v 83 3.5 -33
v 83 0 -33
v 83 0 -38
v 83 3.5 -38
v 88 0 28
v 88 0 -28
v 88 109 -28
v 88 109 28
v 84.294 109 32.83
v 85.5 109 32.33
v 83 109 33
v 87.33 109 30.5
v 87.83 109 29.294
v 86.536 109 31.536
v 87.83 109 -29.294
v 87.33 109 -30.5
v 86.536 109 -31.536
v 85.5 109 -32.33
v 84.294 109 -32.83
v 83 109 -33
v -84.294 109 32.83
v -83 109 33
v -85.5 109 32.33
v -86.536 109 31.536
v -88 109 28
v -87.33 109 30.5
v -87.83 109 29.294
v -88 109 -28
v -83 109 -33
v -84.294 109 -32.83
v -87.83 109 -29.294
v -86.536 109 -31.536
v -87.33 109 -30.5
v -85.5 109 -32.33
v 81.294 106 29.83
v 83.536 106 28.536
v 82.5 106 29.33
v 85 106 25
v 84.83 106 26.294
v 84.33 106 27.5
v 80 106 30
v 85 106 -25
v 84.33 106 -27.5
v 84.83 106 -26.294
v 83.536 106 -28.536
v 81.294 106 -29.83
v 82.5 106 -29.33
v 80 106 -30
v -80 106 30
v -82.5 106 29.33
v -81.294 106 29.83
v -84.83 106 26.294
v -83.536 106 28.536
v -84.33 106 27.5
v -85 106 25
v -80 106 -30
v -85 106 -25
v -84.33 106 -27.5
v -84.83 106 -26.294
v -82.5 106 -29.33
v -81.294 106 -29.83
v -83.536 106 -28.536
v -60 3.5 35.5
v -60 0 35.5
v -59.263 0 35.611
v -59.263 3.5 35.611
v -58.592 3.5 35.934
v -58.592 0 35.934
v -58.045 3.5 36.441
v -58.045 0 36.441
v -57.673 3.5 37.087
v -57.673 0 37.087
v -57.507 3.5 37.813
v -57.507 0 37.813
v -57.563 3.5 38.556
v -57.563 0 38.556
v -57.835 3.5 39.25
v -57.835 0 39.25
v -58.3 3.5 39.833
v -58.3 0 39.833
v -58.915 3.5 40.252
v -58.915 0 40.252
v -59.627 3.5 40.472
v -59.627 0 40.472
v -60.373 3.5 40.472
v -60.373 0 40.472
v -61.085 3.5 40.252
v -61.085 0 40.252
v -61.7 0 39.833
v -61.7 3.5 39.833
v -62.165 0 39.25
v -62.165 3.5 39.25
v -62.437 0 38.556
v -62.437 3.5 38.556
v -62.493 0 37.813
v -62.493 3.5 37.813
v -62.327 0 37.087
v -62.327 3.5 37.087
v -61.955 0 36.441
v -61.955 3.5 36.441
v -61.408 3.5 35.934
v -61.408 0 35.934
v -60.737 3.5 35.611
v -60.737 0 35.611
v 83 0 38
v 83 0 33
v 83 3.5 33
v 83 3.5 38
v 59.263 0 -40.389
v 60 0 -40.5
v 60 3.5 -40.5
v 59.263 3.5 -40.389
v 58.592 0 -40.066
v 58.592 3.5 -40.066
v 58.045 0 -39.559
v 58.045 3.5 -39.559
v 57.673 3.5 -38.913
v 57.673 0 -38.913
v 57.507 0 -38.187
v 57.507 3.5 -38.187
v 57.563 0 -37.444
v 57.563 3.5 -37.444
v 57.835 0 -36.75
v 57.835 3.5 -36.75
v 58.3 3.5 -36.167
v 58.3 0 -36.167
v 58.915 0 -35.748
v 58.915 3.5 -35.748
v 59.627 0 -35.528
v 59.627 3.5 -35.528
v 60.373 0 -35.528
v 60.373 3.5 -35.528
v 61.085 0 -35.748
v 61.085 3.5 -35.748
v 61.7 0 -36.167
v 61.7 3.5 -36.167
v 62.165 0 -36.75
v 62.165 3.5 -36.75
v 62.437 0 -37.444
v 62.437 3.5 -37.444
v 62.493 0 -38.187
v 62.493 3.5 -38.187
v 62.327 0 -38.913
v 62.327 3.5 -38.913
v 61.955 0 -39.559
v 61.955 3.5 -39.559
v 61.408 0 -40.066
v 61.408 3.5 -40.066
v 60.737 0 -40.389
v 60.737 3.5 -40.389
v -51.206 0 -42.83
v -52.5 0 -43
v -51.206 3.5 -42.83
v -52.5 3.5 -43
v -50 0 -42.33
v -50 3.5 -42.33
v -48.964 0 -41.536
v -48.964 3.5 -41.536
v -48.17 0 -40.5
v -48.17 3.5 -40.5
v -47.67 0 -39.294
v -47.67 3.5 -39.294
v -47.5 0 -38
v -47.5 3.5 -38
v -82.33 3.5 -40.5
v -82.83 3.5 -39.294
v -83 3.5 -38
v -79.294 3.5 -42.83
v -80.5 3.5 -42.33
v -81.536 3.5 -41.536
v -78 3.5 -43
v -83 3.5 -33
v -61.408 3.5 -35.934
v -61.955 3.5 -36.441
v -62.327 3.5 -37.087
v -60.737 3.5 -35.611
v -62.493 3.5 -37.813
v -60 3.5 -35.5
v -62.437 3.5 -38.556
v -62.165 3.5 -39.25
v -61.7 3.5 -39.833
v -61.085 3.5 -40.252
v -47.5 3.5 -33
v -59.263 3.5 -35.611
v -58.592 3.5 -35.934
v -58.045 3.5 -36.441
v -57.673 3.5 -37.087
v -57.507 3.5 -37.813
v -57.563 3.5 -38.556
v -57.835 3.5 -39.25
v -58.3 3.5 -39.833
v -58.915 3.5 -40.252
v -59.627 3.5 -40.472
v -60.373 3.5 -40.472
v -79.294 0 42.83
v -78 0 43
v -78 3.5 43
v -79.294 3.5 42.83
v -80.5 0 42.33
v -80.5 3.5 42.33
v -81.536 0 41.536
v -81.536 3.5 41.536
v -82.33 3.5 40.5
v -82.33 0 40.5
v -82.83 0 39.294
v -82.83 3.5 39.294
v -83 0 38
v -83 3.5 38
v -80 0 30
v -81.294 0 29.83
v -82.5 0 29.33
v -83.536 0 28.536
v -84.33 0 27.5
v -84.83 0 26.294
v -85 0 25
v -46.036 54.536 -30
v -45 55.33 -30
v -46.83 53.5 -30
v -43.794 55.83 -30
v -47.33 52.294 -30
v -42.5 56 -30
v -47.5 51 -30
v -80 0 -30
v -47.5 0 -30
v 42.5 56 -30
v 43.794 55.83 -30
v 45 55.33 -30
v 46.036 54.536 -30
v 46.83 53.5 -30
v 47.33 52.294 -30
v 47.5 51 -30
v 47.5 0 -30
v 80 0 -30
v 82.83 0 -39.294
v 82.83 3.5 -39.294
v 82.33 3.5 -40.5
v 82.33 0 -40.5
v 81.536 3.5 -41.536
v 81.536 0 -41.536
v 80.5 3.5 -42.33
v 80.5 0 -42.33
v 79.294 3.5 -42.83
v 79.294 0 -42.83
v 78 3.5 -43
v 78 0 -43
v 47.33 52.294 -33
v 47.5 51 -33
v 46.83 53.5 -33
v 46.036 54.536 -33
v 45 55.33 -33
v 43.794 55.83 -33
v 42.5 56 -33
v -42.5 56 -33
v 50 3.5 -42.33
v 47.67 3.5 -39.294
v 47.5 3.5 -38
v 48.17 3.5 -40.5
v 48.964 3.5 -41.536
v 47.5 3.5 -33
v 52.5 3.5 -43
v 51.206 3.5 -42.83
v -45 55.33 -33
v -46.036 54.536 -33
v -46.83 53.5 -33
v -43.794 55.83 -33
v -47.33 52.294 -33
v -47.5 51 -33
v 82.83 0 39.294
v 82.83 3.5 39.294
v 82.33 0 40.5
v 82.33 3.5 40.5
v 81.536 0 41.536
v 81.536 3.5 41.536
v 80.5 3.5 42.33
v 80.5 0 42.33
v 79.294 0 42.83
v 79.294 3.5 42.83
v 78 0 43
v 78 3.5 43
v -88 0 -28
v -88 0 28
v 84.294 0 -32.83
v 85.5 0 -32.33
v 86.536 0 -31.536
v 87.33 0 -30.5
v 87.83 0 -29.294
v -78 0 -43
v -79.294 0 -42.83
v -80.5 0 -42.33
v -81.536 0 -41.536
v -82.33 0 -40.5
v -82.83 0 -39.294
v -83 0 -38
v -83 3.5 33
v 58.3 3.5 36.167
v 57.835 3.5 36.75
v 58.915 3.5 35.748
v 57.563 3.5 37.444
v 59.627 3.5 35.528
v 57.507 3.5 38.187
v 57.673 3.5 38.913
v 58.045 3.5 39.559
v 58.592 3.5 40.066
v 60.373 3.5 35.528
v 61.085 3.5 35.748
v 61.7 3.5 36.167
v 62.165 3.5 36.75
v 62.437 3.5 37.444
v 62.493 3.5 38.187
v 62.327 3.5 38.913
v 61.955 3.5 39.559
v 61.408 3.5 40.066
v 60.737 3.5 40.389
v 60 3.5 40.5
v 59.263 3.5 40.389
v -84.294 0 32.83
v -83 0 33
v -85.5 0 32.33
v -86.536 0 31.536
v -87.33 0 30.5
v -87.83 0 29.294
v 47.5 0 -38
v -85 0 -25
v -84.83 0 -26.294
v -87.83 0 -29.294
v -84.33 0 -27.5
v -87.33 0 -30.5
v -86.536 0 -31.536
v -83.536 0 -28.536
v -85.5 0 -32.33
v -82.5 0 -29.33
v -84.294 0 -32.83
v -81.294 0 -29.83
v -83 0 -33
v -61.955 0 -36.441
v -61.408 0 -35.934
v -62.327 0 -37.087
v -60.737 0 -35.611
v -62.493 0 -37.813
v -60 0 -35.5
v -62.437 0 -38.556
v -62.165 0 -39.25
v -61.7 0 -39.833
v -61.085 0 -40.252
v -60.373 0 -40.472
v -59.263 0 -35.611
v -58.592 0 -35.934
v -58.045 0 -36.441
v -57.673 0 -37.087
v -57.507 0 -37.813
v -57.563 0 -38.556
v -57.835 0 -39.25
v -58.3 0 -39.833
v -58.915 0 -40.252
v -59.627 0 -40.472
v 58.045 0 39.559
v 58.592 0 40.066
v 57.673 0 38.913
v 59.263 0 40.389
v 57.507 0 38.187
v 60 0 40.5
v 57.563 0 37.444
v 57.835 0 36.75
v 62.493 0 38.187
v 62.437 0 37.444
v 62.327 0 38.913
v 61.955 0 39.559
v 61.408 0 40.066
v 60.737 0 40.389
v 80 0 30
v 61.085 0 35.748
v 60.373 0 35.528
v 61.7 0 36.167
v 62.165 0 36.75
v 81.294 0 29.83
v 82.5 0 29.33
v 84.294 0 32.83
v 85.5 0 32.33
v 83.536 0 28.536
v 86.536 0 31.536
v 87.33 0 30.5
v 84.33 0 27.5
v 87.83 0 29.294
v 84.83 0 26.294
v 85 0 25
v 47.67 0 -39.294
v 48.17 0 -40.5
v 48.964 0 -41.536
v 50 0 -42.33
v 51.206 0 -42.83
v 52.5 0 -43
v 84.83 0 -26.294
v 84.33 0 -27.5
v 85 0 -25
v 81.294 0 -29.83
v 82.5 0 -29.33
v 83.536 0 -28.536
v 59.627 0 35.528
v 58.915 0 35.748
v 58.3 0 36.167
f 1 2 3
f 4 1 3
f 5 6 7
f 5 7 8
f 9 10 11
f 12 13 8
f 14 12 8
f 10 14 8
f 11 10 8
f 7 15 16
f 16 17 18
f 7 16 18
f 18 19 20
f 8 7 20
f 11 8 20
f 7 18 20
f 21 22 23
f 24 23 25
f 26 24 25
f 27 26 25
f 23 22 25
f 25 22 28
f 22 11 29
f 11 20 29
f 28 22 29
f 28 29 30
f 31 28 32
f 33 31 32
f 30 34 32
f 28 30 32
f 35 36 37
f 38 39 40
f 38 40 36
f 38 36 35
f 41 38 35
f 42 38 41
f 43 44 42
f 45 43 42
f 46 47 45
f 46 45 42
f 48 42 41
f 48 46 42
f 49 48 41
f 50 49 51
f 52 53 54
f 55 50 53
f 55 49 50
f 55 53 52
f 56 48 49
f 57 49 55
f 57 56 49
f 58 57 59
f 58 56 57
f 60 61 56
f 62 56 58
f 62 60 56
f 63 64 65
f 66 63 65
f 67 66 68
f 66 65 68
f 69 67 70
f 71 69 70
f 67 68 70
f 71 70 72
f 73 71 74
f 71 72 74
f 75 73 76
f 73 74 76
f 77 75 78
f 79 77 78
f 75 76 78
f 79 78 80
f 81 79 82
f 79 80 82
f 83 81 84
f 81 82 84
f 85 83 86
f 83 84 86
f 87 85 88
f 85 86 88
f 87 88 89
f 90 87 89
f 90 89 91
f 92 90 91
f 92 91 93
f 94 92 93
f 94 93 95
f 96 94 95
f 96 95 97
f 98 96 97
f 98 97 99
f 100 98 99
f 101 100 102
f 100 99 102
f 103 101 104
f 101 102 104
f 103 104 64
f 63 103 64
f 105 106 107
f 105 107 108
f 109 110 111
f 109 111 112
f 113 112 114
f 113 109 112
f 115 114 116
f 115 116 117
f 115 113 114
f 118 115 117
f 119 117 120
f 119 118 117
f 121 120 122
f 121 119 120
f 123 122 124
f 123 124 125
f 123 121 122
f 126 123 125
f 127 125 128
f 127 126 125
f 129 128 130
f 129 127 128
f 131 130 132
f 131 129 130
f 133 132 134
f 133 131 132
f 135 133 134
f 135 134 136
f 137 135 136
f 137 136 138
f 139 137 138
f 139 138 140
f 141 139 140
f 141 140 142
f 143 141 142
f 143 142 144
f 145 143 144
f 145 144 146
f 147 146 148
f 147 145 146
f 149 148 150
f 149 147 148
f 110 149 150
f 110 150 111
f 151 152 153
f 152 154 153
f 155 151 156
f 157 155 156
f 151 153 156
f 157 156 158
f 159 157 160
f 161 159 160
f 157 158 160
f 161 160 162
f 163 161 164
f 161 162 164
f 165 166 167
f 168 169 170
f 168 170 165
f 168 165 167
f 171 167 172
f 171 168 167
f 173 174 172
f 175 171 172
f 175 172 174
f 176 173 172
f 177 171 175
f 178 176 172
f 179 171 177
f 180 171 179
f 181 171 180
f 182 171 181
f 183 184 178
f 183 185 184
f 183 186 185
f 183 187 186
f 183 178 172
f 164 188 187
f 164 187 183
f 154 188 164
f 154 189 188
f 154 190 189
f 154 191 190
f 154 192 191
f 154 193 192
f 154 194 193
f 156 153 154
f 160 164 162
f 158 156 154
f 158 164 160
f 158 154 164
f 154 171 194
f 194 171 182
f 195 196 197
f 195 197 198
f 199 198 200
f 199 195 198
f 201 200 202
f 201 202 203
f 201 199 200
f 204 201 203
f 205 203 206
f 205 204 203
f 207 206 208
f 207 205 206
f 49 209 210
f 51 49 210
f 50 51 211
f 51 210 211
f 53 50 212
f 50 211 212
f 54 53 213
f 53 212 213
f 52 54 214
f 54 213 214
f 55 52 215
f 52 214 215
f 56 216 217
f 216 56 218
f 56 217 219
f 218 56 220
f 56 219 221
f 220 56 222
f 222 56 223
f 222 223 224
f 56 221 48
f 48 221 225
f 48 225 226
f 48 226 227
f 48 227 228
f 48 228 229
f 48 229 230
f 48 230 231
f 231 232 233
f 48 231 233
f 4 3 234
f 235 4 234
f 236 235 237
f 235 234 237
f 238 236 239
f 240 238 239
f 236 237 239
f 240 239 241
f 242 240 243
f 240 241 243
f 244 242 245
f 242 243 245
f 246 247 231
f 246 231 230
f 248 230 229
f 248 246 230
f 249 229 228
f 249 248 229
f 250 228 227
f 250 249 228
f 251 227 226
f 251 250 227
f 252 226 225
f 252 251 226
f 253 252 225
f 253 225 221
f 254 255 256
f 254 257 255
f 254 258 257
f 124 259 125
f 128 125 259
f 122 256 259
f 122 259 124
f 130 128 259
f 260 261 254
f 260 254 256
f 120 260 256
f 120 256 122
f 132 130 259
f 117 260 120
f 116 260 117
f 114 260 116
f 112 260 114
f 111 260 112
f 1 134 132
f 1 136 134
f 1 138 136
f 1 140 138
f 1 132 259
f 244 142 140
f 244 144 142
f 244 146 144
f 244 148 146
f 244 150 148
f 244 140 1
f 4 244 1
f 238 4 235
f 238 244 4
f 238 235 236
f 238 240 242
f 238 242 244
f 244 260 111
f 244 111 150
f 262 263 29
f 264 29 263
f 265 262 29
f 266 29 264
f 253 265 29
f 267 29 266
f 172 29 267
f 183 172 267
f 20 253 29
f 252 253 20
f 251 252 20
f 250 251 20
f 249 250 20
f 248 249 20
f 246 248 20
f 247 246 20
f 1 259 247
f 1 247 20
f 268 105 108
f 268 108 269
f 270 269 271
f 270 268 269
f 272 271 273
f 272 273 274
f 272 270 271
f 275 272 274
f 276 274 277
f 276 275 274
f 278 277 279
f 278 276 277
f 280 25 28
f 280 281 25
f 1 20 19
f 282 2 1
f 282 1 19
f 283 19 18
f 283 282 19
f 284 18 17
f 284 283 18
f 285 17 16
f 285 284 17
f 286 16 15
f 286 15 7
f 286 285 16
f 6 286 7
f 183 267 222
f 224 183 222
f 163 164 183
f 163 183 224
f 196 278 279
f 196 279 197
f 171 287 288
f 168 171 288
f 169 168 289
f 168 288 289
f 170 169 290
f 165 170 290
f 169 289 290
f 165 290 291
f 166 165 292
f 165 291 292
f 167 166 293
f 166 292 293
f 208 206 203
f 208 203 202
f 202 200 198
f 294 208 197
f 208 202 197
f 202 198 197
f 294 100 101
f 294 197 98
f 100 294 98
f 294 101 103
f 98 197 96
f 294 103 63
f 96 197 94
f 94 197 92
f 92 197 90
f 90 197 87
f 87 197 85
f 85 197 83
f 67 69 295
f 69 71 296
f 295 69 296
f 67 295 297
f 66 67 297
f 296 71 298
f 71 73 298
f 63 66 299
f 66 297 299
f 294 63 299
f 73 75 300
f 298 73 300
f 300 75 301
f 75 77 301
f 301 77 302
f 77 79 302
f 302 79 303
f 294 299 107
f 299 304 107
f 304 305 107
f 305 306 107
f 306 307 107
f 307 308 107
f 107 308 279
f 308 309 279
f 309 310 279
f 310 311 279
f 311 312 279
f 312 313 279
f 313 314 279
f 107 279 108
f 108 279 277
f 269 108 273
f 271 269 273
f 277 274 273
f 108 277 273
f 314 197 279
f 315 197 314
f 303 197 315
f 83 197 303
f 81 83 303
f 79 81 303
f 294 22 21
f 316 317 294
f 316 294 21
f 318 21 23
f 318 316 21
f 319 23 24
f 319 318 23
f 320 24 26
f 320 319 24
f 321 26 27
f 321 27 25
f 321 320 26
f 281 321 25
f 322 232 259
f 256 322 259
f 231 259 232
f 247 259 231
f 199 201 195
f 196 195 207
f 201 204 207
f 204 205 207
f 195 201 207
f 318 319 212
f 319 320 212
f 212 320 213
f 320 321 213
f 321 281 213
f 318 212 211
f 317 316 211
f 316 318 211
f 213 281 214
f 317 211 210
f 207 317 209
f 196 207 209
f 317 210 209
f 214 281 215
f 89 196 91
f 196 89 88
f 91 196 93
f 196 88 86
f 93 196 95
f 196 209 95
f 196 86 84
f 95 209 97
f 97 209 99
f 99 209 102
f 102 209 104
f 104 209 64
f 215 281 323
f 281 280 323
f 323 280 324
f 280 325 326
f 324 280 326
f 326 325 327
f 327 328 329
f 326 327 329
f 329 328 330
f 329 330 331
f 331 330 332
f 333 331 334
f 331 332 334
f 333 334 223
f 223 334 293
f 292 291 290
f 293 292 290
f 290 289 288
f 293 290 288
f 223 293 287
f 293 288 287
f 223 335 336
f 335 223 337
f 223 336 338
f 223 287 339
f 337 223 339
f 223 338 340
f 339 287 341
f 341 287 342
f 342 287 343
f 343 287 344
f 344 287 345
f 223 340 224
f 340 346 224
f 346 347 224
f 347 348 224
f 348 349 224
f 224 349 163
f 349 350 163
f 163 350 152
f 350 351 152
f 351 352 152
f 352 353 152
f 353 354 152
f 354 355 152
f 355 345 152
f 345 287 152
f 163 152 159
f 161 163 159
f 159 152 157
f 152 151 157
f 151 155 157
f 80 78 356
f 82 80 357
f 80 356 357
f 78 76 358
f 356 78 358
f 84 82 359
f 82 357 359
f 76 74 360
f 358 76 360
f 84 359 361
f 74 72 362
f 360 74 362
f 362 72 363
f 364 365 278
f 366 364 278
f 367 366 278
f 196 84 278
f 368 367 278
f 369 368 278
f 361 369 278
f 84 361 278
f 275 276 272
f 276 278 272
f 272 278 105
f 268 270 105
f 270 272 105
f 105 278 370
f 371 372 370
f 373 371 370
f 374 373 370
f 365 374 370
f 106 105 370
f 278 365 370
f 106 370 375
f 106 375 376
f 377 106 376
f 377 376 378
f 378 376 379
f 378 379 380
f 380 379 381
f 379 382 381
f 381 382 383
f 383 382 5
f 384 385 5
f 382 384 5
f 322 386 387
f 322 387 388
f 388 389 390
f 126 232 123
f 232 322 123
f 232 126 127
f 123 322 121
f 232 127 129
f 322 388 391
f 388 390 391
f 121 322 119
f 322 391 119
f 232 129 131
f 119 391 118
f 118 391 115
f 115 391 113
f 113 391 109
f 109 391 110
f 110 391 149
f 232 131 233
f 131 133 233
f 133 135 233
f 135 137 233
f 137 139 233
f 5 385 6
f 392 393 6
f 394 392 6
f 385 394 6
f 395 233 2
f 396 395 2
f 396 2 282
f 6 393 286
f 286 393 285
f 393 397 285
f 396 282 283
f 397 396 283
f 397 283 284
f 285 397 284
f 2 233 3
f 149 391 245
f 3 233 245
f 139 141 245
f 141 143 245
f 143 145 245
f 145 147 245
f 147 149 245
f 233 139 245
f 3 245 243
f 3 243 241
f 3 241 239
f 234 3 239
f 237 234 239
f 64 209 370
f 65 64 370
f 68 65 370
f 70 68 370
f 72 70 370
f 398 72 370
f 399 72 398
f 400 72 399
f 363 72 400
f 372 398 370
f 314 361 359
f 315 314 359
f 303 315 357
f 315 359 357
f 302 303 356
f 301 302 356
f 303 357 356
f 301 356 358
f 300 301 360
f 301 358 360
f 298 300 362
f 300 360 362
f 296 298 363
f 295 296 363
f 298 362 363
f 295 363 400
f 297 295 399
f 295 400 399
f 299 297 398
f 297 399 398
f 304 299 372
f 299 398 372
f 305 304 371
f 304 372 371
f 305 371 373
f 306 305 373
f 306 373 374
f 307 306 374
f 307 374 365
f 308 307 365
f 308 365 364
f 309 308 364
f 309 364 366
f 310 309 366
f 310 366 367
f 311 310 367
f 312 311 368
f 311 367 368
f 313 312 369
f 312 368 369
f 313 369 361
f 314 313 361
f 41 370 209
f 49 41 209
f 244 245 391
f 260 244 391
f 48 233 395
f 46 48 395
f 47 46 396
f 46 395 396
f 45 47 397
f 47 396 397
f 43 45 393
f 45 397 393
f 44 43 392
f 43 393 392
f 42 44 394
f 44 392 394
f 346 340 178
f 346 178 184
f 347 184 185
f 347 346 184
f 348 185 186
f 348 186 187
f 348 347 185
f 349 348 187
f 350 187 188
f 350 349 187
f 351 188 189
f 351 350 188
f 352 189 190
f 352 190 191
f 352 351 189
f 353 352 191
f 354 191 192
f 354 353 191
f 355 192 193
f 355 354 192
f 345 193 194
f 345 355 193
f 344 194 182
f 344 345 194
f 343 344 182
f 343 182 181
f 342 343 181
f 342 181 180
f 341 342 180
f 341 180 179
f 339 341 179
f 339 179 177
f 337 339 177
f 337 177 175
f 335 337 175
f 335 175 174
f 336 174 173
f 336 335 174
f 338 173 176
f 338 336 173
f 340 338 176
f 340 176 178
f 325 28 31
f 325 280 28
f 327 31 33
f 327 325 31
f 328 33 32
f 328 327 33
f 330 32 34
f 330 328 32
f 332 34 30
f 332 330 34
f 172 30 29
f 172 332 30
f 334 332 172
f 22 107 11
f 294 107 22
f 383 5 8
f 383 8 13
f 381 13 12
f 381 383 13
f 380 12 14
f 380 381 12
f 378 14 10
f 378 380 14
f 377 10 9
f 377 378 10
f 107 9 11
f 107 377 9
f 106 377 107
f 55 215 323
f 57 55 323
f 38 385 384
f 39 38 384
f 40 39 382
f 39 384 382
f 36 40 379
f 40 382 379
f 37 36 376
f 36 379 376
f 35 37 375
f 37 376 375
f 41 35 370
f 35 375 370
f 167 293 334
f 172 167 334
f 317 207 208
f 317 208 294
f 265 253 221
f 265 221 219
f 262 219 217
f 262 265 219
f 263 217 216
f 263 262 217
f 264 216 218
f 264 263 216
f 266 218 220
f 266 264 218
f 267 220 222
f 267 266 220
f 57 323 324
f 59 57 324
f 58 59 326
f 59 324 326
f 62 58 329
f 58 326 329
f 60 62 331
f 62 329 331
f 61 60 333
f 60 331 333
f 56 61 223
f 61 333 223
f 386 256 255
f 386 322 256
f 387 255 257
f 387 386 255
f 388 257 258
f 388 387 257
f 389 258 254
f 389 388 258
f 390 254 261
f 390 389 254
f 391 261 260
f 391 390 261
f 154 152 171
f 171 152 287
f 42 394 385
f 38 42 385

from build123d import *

# Parameters (mm, degrees)
BOSS_EXTRUDE1_DEPTH = 106
BOSS_EXTRUDE2_DEPTH = 3
SKETCH3_R           = 2.5
BOSS_EXTRUDE3_DEPTH = 3.5
CUT_EXTRUDE1_DEPTH  = 16.5
FILLET1_R           = 5


with BuildPart() as part:
    # Sketch1 → Boss-Extrude1 (new body)
    with BuildSketch(Plane(origin=(0, 0, 0), x_dir=(1, 0, 0), z_dir=(0, 1, 0))):
        with BuildLine():
            Line((83, -33), (-83, -33))
            ThreePointArc((-83, -33), (-86.535533906, -31.535533906), (-88, -28))
            Line((-88, -28), (-88, 28))
            ThreePointArc((-88, 28), (-86.535533906, 31.535533906), (-83, 33))
            Line((-83, 33), (83, 33))
            ThreePointArc((83, 33), (86.535533906, 31.535533906), (88, 28))
            Line((88, 28), (88, -28))
            ThreePointArc((88, -28), (86.535533906, -31.535533906), (83, -33))
        make_face()
        with BuildLine():
            Line((80, -30), (-80, -30))
            ThreePointArc((-80, -30), (-83.535533906, -28.535533906), (-85, -25))
            Line((-85, -25), (-85, 25))
            ThreePointArc((-85, 25), (-83.535533906, 28.535533906), (-80, 30))
            Line((-80, 30), (80, 30))
            ThreePointArc((80, 30), (83.535533906, 28.535533906), (85, 25))
            Line((85, 25), (85, -25))
            ThreePointArc((85, -25), (83.535533906, -28.535533906), (80, -30))
        make_face(mode=Mode.SUBTRACT)
    extrude(amount=BOSS_EXTRUDE1_DEPTH)

    # Sketch2 → Boss-Extrude2 (add)
    with BuildSketch(Plane(origin=(0, 106, 0), x_dir=(1, 0, 0), z_dir=(0, 1, 0))):
        with BuildLine():
            Line((-83, 33), (83, 33))
            ThreePointArc((83, 33), (86.535533906, 31.535533906), (88, 28))
            Line((88, 28), (88, -28))
            ThreePointArc((88, -28), (86.535533906, -31.535533906), (83, -33))
            Line((83, -33), (-83, -33))
            ThreePointArc((-83, -33), (-86.535533906, -31.535533906), (-88, -28))
            Line((-88, -28), (-88, 28))
            ThreePointArc((-88, 28), (-86.535533906, 31.535533906), (-83, 33))
        make_face()
    extrude(amount=BOSS_EXTRUDE2_DEPTH)

    # Sketch3 → Boss-Extrude3 (add)
    with BuildSketch(Plane.XZ):
        with BuildLine():
            Line((-83, 33), (83, 33))
            Line((83, 33), (83, 38))
            ThreePointArc((83, 38), (81.535533906, 41.535533906), (78, 43))
            Line((78, 43), (-78, 43))
            ThreePointArc((-78, 43), (-81.535533906, 41.535533906), (-83, 38))
            Line((-83, 38), (-83, 33))
        make_face()
        with Locations(Location((-60, 38, 0), (0, 0, 270))):
            Circle(SKETCH3_R, mode=Mode.SUBTRACT)
        with Locations(Location((60, 38, 0), (0, 0, 90))):
            Circle(SKETCH3_R, mode=Mode.SUBTRACT)
    boss_extrude3 = extrude(amount=-BOSS_EXTRUDE3_DEPTH)

    # Mirror1: Boss-Extrude3 across plane
    add(boss_extrude3.mirror(Plane.XY))

    # Sketch4 → Cut-Extrude1 (cut, symmetric)
    with BuildSketch(Plane(origin=(0, 0, -33), x_dir=(-1, 0, 0), z_dir=(0, 0, -1))):
        with BuildLine():
            Line((47.5, -56), (-47.5, -56))
            Line((-47.5, -56), (-47.5, 51))
            ThreePointArc((-47.5, 51), (-46.035533906, 54.535533906), (-42.5, 56))
            Line((-42.5, 56), (42.5, 56))
            ThreePointArc((42.5, 56), (46.035533906, 54.535533906), (47.5, 51))
            Line((47.5, 51), (47.5, -56))
        make_face()
    extrude(amount=CUT_EXTRUDE1_DEPTH, both=True, mode=Mode.SUBTRACT)

    # Fillet1
    fillet1_edges = [part.edges().sort_by_distance(p)[0] for p in [
        (47.5, 1.75, -43),
        (-47.5, 1.75, -43),
    ]]
    fillet(fillet1_edges, radius=FILLET1_R)


solid = part.part
